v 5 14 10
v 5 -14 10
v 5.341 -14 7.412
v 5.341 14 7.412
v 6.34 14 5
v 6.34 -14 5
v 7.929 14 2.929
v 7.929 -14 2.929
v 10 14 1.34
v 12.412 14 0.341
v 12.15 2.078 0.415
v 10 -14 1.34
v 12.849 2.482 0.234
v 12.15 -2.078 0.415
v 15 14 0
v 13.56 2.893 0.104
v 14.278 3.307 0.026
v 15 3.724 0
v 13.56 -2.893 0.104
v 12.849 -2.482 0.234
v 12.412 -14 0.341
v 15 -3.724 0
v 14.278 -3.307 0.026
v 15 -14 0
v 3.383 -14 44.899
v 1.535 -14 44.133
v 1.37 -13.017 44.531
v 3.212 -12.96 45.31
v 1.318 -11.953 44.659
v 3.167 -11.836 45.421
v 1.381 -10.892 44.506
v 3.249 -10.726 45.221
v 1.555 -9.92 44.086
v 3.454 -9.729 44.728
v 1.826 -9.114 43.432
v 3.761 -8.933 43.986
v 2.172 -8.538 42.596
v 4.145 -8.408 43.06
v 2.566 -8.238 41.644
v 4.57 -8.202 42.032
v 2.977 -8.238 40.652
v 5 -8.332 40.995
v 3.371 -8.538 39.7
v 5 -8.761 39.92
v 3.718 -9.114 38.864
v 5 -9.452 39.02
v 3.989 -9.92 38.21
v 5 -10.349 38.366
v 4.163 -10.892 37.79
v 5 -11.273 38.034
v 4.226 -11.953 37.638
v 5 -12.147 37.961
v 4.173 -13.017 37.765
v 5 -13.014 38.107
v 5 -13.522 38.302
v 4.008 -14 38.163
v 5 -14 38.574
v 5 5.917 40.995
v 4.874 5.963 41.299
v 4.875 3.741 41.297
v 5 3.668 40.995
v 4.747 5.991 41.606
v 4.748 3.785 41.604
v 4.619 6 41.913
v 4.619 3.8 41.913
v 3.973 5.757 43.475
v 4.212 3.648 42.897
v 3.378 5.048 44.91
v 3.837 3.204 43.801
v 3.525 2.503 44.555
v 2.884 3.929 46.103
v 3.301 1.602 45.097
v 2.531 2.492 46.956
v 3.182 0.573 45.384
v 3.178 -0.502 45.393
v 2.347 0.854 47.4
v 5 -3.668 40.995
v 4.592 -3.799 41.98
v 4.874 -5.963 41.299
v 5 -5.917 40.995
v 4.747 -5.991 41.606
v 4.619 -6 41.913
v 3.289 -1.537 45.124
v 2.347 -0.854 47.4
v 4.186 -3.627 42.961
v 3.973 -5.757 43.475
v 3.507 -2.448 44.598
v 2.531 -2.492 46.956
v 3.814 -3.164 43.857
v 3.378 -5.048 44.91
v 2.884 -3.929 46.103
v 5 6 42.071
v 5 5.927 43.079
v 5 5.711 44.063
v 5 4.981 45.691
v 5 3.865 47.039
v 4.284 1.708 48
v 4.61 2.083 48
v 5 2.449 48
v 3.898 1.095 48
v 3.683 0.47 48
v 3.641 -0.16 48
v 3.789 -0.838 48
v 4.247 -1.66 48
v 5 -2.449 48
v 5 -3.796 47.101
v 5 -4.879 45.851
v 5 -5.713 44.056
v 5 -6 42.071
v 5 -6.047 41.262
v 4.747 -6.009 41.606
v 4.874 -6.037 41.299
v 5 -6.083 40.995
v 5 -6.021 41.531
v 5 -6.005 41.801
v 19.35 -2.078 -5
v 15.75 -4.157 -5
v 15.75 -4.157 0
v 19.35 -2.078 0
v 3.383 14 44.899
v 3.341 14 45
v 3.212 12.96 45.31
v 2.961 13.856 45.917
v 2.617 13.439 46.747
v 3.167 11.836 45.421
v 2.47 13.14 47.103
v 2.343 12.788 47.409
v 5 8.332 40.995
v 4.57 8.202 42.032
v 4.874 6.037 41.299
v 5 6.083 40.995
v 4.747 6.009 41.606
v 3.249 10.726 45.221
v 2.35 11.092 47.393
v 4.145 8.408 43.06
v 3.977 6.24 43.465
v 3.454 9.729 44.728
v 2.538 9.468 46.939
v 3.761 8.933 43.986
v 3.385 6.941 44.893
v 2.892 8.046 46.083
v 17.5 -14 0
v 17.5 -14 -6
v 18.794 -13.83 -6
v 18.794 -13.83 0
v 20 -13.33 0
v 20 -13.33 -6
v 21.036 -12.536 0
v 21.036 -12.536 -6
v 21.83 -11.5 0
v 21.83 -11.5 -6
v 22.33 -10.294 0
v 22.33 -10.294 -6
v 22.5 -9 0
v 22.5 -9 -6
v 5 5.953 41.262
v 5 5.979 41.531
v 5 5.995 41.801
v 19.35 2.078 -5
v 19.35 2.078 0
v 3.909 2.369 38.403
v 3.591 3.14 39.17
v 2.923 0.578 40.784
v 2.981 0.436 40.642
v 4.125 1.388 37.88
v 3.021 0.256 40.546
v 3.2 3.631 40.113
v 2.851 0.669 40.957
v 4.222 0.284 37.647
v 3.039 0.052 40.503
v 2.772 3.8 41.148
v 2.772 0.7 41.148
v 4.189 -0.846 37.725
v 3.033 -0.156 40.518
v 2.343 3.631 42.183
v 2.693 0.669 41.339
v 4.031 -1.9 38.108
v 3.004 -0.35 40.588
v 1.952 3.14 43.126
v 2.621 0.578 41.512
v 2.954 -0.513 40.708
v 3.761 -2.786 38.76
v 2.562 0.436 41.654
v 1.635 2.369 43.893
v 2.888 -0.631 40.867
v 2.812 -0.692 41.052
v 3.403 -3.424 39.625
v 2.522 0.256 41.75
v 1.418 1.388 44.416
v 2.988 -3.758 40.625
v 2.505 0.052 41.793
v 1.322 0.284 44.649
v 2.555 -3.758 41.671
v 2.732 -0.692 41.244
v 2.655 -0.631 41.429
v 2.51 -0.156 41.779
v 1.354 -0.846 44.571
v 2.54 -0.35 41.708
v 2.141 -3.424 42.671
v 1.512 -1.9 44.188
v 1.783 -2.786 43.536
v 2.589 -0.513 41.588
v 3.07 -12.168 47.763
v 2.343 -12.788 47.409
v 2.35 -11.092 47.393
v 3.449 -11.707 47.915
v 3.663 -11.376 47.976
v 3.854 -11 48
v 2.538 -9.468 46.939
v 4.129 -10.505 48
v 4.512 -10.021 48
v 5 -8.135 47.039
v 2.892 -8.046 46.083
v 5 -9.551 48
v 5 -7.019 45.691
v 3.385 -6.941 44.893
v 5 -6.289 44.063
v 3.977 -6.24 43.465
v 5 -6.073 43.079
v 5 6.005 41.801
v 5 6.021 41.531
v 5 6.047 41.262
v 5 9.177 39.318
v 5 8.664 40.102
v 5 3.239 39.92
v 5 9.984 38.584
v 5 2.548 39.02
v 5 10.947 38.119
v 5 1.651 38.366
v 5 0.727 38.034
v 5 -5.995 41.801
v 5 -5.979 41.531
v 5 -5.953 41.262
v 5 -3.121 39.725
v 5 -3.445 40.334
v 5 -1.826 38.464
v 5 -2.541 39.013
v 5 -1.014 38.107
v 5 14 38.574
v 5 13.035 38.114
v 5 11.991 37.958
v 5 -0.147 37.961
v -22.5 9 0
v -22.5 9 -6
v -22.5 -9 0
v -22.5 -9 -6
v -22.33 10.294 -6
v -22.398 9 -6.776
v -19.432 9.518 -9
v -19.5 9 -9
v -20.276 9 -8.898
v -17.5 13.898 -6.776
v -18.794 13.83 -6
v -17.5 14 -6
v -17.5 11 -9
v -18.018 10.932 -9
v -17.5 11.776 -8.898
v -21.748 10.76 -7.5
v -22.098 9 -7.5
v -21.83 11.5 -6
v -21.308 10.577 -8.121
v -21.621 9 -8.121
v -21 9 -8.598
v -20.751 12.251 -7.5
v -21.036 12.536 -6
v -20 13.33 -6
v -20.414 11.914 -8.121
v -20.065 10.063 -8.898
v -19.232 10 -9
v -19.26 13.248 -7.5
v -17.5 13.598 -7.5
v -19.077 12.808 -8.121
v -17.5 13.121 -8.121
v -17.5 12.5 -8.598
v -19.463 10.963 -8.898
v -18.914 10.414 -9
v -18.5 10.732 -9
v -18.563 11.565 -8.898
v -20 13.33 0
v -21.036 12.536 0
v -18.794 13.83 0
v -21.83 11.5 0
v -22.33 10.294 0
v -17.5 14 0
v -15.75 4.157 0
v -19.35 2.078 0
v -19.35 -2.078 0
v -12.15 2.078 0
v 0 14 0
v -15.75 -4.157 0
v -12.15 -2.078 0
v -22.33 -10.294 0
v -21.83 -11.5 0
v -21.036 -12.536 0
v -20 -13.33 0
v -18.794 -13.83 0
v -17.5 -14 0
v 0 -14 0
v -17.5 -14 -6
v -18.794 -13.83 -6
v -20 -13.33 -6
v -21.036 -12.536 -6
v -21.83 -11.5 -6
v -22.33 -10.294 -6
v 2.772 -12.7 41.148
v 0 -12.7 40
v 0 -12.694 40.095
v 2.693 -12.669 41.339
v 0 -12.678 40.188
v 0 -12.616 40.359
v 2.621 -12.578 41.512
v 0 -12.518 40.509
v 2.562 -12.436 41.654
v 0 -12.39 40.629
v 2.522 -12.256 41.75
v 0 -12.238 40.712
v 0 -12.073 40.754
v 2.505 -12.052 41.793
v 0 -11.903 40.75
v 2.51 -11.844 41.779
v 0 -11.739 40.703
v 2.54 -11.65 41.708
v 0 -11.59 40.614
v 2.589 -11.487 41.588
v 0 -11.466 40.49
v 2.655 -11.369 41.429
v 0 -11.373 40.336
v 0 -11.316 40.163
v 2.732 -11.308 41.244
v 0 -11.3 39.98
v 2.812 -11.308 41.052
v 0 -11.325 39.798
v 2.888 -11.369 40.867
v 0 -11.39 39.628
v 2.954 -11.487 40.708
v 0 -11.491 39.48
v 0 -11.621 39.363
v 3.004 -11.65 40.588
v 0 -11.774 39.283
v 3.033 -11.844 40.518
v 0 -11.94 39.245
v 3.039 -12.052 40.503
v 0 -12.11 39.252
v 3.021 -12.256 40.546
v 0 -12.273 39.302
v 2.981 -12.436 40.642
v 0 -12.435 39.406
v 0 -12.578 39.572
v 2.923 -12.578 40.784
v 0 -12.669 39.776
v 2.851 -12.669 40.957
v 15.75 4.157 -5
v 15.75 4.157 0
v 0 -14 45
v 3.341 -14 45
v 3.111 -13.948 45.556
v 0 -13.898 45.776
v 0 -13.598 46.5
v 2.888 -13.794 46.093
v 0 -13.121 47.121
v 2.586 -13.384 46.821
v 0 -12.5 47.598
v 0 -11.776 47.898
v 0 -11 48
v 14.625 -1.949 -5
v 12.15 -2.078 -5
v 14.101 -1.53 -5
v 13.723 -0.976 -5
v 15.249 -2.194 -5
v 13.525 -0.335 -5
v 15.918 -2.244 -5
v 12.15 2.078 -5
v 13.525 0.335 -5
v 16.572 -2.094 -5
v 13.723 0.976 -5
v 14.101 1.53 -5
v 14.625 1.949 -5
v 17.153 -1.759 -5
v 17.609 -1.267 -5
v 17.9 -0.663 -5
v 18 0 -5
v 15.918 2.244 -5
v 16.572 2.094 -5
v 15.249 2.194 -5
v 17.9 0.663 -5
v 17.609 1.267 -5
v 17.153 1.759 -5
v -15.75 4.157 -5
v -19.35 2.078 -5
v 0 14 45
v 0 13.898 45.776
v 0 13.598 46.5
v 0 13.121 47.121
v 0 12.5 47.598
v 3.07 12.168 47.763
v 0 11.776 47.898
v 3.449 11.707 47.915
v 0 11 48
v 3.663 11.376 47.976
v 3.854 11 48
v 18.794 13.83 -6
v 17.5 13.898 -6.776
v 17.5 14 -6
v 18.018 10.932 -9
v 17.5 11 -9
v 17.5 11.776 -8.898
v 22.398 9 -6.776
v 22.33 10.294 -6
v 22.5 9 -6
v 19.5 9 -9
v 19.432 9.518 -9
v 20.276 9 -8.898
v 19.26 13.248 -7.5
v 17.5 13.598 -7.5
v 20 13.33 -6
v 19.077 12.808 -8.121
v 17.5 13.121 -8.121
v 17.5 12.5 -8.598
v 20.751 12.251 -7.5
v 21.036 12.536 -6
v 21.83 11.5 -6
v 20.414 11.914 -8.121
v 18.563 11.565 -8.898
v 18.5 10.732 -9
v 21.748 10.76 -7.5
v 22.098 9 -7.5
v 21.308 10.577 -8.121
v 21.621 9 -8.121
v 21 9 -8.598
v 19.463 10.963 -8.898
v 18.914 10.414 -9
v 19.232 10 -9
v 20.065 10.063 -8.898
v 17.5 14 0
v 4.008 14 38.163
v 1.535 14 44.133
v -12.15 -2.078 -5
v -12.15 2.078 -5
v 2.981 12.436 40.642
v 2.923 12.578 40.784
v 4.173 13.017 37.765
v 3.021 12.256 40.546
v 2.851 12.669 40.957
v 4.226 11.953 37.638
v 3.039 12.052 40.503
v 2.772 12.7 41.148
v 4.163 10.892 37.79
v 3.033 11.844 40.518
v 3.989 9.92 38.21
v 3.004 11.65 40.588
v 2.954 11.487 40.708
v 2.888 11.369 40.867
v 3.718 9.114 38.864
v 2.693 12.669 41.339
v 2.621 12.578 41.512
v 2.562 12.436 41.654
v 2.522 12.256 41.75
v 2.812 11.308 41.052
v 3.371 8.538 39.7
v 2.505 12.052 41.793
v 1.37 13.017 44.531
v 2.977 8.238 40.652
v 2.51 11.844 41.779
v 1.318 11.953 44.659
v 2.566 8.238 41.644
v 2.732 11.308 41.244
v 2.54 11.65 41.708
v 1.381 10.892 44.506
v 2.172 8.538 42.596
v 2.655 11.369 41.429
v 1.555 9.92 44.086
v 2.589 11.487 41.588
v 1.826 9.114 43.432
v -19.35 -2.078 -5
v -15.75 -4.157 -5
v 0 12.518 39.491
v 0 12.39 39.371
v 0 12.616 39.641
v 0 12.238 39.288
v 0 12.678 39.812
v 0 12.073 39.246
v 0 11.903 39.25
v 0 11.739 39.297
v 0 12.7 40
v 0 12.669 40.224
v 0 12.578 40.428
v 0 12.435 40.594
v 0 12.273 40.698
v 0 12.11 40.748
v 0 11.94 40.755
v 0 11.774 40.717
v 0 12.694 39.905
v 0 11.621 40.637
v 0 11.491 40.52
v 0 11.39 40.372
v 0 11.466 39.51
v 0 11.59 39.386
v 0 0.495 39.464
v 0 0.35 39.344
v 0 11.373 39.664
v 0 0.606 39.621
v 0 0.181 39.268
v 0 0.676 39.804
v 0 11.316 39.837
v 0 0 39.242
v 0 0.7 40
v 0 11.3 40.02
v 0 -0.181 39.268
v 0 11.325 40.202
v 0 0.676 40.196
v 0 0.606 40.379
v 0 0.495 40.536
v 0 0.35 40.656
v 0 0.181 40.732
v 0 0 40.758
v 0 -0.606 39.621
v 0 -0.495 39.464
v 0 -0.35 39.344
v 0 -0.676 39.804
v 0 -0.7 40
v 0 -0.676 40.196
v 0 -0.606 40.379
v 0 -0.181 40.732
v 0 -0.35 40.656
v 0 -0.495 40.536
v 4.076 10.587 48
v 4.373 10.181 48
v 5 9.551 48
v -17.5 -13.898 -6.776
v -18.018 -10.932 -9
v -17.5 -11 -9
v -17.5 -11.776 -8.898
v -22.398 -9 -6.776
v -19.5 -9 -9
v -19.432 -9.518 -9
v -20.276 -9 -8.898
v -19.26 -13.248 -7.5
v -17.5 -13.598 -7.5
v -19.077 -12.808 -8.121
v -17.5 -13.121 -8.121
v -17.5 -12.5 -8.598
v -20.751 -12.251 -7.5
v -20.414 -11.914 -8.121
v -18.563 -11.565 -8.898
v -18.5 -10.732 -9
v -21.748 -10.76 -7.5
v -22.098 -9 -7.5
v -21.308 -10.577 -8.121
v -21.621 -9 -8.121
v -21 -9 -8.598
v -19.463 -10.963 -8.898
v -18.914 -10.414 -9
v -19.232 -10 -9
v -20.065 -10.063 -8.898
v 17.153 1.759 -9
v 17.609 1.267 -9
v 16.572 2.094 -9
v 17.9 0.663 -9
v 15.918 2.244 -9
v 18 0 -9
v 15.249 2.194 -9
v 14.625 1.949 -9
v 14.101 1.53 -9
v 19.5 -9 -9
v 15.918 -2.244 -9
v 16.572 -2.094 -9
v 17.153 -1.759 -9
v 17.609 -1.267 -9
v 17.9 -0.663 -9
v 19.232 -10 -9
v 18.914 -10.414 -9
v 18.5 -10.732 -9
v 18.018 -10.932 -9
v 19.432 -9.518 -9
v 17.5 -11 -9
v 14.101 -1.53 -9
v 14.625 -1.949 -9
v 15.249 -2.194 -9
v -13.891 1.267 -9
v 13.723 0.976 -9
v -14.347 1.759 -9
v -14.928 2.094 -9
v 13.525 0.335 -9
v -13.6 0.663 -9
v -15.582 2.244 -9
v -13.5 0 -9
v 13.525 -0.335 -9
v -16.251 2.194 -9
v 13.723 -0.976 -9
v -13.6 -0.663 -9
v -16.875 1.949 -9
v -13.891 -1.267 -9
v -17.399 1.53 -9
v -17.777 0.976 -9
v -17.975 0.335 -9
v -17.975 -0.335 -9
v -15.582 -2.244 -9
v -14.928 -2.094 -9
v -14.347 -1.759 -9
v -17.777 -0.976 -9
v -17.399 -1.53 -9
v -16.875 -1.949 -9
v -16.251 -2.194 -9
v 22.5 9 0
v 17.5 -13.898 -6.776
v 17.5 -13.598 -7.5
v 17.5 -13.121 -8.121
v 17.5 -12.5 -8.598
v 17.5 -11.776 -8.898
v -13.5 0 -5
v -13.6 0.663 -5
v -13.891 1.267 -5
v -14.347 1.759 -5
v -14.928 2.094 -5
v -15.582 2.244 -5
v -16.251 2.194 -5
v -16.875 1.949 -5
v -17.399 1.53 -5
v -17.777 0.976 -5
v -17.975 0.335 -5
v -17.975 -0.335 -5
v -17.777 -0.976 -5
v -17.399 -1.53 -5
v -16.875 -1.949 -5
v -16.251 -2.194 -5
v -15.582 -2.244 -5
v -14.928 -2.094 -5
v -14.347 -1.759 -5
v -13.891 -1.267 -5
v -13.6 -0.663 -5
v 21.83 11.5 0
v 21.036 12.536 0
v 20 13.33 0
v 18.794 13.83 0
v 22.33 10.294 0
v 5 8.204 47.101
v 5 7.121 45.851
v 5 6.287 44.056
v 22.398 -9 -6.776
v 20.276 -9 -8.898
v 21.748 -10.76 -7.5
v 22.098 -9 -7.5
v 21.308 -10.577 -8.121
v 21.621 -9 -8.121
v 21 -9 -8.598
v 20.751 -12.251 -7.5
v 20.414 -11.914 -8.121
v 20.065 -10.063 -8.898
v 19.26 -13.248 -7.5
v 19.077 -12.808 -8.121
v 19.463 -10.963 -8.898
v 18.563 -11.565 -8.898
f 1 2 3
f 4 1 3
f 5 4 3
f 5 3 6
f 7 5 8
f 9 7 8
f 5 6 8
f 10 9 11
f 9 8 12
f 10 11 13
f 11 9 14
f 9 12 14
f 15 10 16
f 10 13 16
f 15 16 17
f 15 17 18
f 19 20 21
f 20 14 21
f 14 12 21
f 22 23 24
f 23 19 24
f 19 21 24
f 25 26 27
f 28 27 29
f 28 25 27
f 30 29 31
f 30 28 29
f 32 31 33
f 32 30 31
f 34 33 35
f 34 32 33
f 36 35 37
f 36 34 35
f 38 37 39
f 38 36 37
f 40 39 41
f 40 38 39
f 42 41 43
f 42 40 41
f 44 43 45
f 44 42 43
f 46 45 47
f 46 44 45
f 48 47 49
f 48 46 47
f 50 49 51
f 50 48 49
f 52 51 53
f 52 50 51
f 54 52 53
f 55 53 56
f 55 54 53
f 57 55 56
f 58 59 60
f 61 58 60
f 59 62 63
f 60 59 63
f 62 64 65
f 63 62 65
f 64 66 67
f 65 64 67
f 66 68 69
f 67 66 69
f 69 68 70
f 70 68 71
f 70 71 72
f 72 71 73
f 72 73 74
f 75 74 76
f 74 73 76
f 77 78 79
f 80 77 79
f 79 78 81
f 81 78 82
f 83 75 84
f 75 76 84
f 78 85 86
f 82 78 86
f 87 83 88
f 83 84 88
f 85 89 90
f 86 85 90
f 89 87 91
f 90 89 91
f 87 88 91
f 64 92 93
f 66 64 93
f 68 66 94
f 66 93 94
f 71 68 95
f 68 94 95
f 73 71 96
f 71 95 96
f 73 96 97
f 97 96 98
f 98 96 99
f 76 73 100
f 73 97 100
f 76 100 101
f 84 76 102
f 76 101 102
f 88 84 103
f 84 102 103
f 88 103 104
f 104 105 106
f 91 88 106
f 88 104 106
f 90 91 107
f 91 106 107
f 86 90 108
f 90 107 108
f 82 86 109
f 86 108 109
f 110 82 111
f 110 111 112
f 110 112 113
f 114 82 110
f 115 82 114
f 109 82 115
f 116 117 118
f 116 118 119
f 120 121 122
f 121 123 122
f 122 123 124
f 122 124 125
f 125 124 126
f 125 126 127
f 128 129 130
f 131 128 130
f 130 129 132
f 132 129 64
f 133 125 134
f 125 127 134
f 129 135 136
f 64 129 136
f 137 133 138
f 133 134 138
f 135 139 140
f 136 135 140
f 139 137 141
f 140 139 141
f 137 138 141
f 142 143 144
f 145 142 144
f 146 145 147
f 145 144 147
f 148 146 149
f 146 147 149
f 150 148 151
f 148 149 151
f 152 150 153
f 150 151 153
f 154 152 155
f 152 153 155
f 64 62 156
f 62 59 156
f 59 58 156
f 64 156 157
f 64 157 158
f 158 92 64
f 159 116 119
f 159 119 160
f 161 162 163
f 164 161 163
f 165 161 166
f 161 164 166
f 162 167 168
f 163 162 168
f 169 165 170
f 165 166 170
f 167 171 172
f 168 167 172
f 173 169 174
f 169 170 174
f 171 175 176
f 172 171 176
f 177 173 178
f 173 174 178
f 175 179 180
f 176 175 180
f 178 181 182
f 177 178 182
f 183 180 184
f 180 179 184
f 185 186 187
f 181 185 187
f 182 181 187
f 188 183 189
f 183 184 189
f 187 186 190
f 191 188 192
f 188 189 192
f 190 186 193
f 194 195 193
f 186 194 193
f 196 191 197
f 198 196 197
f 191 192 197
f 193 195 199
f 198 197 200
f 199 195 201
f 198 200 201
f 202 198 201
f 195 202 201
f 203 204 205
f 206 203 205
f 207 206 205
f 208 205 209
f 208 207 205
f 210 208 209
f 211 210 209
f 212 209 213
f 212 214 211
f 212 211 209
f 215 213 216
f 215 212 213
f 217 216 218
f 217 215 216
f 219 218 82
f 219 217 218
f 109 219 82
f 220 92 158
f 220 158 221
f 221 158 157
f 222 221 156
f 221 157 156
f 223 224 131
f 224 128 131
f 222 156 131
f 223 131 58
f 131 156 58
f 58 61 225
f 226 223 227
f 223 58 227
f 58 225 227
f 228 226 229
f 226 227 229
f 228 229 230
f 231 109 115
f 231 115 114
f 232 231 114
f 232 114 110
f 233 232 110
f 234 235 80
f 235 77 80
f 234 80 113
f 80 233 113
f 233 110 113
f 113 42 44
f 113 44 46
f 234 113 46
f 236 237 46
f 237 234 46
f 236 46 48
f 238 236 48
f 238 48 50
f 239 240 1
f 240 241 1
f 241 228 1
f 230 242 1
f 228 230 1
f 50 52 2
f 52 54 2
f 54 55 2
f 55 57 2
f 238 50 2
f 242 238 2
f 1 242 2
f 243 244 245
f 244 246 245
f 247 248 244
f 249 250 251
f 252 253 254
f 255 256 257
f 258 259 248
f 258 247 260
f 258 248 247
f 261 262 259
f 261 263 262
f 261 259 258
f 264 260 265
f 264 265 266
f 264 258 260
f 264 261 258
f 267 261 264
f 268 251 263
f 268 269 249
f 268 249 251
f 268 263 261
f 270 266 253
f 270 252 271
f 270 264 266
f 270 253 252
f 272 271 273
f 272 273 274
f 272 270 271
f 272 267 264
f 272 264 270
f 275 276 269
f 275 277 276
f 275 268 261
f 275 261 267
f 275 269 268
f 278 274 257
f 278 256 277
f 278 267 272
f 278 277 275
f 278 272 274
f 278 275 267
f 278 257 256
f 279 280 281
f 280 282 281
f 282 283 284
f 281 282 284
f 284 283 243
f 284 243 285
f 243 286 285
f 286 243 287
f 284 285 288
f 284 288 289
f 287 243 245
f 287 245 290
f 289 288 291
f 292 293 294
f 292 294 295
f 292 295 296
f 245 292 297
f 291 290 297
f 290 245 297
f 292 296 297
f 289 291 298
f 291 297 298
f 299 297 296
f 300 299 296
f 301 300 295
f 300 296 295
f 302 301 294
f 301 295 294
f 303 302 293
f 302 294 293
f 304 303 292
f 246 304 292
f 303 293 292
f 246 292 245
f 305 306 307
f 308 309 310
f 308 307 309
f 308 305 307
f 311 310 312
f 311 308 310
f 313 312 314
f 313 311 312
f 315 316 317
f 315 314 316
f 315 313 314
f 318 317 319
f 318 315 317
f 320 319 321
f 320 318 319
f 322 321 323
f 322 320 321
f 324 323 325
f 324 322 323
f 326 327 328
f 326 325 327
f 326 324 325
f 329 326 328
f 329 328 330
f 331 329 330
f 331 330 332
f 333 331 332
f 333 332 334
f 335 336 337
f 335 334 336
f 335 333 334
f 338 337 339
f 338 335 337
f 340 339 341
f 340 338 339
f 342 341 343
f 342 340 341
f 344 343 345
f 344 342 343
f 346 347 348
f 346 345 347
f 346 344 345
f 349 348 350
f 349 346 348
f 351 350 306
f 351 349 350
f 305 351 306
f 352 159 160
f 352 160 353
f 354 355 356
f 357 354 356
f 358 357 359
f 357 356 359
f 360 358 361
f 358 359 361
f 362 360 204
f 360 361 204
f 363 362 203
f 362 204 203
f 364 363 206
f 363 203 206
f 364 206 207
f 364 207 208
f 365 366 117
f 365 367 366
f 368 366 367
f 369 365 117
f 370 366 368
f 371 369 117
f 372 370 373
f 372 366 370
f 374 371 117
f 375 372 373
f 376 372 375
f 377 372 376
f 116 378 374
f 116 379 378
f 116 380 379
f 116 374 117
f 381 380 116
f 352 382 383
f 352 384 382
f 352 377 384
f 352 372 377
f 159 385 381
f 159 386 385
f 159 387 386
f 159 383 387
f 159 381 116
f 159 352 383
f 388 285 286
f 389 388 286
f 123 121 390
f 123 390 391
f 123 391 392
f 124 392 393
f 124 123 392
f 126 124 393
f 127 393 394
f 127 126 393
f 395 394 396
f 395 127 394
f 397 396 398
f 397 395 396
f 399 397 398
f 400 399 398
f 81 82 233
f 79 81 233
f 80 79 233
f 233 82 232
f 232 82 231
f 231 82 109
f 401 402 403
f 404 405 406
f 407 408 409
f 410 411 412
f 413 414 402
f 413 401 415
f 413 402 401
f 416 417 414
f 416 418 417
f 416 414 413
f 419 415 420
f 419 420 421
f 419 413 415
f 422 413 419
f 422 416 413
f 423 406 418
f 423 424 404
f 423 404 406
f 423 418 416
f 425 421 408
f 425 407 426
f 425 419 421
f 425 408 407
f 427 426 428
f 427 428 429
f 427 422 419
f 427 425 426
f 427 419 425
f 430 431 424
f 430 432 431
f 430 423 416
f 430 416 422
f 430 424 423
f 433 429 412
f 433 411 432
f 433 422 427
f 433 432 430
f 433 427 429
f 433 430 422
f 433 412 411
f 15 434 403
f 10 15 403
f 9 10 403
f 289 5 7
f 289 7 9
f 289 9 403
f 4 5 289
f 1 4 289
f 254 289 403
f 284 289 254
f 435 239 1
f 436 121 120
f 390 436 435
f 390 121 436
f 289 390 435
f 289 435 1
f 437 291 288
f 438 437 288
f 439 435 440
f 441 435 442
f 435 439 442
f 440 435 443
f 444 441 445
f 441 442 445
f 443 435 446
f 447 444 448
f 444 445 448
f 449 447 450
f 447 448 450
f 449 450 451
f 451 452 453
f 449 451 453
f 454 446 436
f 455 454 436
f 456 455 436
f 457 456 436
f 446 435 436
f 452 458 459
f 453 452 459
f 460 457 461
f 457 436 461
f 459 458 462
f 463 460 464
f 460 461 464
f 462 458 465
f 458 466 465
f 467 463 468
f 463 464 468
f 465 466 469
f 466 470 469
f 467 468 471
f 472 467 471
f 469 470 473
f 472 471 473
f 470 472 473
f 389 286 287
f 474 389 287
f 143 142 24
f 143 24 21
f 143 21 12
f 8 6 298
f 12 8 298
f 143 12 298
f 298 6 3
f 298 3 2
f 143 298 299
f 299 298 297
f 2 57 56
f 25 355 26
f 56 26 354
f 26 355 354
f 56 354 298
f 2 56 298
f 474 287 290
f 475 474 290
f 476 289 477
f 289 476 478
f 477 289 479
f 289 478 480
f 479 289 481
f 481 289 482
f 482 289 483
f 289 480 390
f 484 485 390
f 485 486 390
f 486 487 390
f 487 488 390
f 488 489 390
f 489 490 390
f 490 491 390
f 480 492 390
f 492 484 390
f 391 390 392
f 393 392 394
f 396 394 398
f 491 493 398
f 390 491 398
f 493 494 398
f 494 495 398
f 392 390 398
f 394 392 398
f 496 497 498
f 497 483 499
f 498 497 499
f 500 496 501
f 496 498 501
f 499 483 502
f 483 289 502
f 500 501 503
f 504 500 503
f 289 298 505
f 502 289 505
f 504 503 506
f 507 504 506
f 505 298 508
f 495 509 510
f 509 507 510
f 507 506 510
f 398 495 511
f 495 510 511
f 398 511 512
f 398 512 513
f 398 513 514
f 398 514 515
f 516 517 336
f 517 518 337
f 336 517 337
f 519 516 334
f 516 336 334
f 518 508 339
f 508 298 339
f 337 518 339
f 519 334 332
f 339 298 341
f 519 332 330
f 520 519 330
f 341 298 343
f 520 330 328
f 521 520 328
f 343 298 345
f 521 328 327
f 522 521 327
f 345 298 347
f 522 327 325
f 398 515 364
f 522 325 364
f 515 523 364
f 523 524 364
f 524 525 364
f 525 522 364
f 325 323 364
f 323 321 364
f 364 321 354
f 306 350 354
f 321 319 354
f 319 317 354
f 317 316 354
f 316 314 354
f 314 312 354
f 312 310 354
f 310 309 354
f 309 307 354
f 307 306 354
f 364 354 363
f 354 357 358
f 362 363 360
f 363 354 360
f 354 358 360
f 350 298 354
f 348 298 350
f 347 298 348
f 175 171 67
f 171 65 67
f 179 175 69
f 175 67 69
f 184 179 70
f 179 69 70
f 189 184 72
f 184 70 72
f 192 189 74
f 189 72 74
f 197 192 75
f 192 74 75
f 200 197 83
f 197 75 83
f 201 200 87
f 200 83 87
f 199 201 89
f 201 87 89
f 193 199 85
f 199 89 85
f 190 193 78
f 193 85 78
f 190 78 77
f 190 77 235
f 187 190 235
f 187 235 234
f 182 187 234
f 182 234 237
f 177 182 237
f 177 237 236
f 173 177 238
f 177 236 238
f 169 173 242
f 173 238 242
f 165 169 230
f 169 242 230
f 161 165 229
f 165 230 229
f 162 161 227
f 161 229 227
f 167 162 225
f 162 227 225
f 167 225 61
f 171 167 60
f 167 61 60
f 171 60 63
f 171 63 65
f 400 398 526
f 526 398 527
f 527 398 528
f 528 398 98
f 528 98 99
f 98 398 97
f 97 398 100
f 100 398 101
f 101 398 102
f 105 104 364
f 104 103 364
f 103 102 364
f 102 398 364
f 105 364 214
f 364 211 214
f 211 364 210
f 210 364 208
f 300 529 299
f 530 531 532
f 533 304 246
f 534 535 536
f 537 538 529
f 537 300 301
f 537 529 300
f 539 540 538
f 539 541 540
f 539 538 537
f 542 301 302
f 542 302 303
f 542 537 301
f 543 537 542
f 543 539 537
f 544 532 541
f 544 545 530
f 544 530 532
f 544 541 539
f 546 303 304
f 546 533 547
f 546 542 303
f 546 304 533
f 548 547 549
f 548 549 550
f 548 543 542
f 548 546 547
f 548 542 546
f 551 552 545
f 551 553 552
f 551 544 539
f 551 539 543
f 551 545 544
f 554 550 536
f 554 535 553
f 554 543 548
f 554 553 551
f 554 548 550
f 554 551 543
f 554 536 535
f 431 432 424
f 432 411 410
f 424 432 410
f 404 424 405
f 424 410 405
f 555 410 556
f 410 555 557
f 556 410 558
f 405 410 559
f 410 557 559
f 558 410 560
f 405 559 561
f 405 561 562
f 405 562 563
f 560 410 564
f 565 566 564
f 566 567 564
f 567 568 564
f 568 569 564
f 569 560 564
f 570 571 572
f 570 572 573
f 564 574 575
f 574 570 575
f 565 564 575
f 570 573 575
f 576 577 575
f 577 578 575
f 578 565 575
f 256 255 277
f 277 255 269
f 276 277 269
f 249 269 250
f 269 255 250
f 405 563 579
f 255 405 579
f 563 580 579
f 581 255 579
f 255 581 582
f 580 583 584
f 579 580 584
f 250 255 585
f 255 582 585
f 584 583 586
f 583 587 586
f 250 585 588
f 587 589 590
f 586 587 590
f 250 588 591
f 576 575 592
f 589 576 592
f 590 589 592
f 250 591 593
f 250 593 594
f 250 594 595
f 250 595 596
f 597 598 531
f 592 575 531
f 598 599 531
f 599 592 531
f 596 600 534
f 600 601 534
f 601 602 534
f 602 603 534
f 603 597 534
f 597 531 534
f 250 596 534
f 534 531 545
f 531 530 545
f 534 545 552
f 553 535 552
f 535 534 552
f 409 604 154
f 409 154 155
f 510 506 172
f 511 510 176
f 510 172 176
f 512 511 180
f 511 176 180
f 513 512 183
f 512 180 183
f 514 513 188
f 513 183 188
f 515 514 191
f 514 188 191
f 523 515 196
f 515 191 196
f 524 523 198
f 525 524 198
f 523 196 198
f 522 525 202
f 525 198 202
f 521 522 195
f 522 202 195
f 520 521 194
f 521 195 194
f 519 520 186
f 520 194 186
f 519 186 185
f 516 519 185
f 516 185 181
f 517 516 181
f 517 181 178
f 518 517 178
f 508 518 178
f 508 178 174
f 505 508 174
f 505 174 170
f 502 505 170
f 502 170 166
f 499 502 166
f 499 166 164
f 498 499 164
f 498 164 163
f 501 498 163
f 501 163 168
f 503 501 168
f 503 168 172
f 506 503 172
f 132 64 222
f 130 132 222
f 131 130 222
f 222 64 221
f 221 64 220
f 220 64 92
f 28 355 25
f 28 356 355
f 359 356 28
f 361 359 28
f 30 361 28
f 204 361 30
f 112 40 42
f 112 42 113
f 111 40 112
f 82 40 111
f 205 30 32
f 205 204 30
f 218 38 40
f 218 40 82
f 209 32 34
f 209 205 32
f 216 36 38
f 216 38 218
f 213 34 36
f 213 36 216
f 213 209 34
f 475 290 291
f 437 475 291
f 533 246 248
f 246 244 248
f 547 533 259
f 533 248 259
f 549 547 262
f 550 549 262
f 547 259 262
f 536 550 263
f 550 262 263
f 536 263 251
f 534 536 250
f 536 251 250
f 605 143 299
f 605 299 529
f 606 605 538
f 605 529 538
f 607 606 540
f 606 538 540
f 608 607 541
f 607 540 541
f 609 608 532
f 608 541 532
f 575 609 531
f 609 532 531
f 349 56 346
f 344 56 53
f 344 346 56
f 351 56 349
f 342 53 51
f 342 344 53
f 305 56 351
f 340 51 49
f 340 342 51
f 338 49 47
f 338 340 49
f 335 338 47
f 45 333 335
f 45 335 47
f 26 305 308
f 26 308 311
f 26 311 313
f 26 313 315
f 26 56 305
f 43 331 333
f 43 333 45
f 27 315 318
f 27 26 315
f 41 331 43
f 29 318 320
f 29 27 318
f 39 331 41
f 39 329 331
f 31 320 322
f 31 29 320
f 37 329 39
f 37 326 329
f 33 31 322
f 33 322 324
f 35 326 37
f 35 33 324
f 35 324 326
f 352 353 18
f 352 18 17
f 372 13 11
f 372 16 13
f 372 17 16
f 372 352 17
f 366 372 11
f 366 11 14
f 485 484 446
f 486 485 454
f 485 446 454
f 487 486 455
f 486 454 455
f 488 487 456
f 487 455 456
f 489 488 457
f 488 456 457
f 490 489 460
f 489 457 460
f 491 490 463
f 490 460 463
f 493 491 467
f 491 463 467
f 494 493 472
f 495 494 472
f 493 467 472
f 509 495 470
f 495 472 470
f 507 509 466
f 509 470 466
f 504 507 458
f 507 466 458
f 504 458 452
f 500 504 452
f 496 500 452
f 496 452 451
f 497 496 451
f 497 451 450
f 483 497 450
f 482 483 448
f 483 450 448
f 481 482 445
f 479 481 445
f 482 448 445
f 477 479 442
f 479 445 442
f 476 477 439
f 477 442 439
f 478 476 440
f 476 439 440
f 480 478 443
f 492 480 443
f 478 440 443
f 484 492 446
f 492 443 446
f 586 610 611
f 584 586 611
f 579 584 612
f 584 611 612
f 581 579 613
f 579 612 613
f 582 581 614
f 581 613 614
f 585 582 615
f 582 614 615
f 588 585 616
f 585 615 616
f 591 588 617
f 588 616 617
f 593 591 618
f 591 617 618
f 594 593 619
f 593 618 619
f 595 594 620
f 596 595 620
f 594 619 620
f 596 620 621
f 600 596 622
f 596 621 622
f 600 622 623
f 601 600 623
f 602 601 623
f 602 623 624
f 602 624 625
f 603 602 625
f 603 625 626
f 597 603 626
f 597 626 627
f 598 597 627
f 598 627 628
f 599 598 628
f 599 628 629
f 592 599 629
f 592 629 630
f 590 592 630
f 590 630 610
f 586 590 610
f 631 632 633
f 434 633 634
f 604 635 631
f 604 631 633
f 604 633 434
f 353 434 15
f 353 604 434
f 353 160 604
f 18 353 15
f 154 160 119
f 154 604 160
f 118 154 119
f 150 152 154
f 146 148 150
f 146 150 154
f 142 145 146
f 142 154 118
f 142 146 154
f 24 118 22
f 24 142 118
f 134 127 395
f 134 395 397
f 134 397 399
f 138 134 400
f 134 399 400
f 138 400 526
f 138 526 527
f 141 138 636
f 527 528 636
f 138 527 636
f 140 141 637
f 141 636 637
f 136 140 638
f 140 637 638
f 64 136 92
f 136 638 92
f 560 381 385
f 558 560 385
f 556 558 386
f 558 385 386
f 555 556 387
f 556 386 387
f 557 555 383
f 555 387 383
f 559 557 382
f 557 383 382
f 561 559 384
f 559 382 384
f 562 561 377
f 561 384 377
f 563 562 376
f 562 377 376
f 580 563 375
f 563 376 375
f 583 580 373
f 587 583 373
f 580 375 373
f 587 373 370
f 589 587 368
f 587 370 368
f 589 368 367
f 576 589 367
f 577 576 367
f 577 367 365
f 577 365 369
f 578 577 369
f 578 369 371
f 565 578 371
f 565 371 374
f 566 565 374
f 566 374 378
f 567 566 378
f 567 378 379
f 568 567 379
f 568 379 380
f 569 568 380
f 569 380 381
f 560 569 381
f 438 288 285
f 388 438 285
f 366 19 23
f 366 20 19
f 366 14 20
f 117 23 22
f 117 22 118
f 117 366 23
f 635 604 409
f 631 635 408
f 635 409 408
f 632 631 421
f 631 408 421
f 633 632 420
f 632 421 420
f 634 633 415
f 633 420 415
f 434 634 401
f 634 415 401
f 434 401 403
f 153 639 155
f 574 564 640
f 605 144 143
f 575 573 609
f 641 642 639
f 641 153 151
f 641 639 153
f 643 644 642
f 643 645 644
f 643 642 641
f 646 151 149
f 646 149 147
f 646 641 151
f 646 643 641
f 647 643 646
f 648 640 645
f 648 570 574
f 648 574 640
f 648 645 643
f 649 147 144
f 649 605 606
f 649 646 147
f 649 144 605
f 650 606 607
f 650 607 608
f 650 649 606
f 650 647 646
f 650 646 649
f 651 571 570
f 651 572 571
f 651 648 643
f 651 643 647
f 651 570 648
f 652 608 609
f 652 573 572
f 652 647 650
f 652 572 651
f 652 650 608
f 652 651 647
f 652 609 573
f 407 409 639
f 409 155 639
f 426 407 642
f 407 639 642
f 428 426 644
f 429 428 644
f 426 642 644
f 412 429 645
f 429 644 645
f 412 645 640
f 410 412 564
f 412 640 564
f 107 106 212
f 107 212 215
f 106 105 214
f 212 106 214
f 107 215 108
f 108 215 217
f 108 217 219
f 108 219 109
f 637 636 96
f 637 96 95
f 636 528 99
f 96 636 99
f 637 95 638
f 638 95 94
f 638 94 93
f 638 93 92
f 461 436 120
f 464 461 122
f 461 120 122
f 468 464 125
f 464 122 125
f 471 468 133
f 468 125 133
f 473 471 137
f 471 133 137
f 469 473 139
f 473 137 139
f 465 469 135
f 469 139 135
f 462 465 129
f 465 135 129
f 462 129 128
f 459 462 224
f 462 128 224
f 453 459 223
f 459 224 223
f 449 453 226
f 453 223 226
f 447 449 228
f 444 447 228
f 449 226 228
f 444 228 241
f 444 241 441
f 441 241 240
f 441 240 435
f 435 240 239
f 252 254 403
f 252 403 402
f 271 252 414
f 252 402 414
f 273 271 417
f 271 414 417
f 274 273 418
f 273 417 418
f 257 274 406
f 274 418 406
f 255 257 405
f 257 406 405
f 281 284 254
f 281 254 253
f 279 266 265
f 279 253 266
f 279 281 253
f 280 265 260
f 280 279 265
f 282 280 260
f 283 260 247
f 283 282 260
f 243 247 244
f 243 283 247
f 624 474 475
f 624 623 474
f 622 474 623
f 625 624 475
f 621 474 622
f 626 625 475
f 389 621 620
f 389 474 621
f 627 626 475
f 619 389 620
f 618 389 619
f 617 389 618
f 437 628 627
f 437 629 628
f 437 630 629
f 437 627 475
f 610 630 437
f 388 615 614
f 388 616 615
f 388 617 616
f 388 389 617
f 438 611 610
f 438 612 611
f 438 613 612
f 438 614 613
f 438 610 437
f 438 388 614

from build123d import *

# Parameters (mm, degrees)
PAD_DEPTH       = 14
FILLET_R        = 5
FILLET001_R     = 3
SKETCH001_R     = 2.25
POCKET_DEPTH    = 9.001
POCKET001_DEPTH = 5


with BuildPart() as part:
    # Sketch → Pad (new body, symmetric)
    with BuildSketch(Plane.XZ):
        with BuildLine():
            Line((-22.5, 0), (0, 0))
            Line((0, 0), (0, 48))
            Line((0, 48), (5, 48))
            Line((5, 48), (5, 10))
            ThreePointArc((5, 10), (7.928932, 2.928932), (15, 0))
            Line((22.5, 0), (15, 0))
            Line((22.5, 0), (22.5, -9))
            Line((22.5, -9), (-22.5, -9))
            Line((-22.5, -9), (-22.5, 0))
        make_face()
    extrude(amount=PAD_DEPTH, both=True)

    # Fillet
    fillet_edges = [part.edges().sort_by_distance(p)[0] for p in [
        (22.5, -14, -4.5),
        (22.5, 14, -4.5),
        (-22.5, -14, -4.5),
        (-22.5, 14, -4.5),
    ]]
    fillet(fillet_edges, radius=FILLET_R)

    # Fillet001
    fillet001_edges = [part.edges().sort_by_distance(p)[0] for p in [
        (0, -14, -9),
        (21.035534, -12.535534, -9),
        (22.5, 0, -9),
        (21.035534, 12.535534, -9),
        (0, 14, -9),
        (-21.035534, 12.535534, -9),
        (-22.5, 0, -9),
        (-21.035534, -12.535534, -9),
        (2.5, -14, 48),
        (2.5, 14, 48),
    ]]
    fillet(fillet001_edges, radius=FILLET001_R)

    # Sketch002 (on DatumPlane) → Groove (revolve, cut)
    with BuildSketch(Plane(origin=(0, 0, 40), x_dir=(0.92388, 0, 0.382683), z_dir=(-0.382683, 0, 0.92388))):
        Polygon((-7, 0), (-7, 0.7), (3, 0.7), (3, 3.8), (5, 3.8), (5, 6), (15, 6), (15, 0), align=None)
    groove = revolve(axis=Axis((0, 0, 40), (0.92388, 0, 0.382683)), mode=Mode.SUBTRACT)

    # Sketch001 → Pocket (cut, through all)
    with BuildSketch(Plane.XY):
        with Locations((-15.75, 0)):
            Circle(SKETCH001_R)
        with Locations((15.75, 0)):
            Circle(SKETCH001_R)
    extrude(amount=-POCKET_DEPTH, mode=Mode.SUBTRACT)

    # Sketch003 → Pocket001 (cut, symmetric)
    with BuildSketch(Plane.XY):
        Polygon((19.35, -2.078461), (19.35, 2.078461), (15.75, 4.156922), (12.15, 2.078461), (12.15, -2.078461), (15.75, -4.156922), align=None)
        Polygon((-12.15, -2.078461), (-12.15, 2.078461), (-15.75, 4.156922), (-19.35, 2.078461), (-19.35, -2.078461), (-15.75, -4.156922), align=None)
    extrude(amount=POCKET001_DEPTH, both=True, mode=Mode.SUBTRACT)

    # Sketch002 LinearPattern 2 → Groove LinearPattern 2 (revolve, cut)
    with BuildSketch(Plane(origin=(0, 12, 40), x_dir=(0.92388, 0, 0.382683), z_dir=(-0.382683, 0, 0.92388))):
        Polygon((-7, 0), (-7, 0.7), (3, 0.7), (3, 3.8), (5, 3.8), (5, 6), (15, 6), (15, 0), align=None)
    groove_linearpattern_2 = revolve(axis=Axis((0, 12, 40), (0.92388, 0, 0.382683)), mode=Mode.SUBTRACT)

    # Mirrored: Groove, Groove LinearPattern 2 across XZ
    add(groove.mirror(Plane.XZ), mode=Mode.SUBTRACT)
    add(groove_linearpattern_2.mirror(Plane.XZ), mode=Mode.SUBTRACT)


solid = part.part
